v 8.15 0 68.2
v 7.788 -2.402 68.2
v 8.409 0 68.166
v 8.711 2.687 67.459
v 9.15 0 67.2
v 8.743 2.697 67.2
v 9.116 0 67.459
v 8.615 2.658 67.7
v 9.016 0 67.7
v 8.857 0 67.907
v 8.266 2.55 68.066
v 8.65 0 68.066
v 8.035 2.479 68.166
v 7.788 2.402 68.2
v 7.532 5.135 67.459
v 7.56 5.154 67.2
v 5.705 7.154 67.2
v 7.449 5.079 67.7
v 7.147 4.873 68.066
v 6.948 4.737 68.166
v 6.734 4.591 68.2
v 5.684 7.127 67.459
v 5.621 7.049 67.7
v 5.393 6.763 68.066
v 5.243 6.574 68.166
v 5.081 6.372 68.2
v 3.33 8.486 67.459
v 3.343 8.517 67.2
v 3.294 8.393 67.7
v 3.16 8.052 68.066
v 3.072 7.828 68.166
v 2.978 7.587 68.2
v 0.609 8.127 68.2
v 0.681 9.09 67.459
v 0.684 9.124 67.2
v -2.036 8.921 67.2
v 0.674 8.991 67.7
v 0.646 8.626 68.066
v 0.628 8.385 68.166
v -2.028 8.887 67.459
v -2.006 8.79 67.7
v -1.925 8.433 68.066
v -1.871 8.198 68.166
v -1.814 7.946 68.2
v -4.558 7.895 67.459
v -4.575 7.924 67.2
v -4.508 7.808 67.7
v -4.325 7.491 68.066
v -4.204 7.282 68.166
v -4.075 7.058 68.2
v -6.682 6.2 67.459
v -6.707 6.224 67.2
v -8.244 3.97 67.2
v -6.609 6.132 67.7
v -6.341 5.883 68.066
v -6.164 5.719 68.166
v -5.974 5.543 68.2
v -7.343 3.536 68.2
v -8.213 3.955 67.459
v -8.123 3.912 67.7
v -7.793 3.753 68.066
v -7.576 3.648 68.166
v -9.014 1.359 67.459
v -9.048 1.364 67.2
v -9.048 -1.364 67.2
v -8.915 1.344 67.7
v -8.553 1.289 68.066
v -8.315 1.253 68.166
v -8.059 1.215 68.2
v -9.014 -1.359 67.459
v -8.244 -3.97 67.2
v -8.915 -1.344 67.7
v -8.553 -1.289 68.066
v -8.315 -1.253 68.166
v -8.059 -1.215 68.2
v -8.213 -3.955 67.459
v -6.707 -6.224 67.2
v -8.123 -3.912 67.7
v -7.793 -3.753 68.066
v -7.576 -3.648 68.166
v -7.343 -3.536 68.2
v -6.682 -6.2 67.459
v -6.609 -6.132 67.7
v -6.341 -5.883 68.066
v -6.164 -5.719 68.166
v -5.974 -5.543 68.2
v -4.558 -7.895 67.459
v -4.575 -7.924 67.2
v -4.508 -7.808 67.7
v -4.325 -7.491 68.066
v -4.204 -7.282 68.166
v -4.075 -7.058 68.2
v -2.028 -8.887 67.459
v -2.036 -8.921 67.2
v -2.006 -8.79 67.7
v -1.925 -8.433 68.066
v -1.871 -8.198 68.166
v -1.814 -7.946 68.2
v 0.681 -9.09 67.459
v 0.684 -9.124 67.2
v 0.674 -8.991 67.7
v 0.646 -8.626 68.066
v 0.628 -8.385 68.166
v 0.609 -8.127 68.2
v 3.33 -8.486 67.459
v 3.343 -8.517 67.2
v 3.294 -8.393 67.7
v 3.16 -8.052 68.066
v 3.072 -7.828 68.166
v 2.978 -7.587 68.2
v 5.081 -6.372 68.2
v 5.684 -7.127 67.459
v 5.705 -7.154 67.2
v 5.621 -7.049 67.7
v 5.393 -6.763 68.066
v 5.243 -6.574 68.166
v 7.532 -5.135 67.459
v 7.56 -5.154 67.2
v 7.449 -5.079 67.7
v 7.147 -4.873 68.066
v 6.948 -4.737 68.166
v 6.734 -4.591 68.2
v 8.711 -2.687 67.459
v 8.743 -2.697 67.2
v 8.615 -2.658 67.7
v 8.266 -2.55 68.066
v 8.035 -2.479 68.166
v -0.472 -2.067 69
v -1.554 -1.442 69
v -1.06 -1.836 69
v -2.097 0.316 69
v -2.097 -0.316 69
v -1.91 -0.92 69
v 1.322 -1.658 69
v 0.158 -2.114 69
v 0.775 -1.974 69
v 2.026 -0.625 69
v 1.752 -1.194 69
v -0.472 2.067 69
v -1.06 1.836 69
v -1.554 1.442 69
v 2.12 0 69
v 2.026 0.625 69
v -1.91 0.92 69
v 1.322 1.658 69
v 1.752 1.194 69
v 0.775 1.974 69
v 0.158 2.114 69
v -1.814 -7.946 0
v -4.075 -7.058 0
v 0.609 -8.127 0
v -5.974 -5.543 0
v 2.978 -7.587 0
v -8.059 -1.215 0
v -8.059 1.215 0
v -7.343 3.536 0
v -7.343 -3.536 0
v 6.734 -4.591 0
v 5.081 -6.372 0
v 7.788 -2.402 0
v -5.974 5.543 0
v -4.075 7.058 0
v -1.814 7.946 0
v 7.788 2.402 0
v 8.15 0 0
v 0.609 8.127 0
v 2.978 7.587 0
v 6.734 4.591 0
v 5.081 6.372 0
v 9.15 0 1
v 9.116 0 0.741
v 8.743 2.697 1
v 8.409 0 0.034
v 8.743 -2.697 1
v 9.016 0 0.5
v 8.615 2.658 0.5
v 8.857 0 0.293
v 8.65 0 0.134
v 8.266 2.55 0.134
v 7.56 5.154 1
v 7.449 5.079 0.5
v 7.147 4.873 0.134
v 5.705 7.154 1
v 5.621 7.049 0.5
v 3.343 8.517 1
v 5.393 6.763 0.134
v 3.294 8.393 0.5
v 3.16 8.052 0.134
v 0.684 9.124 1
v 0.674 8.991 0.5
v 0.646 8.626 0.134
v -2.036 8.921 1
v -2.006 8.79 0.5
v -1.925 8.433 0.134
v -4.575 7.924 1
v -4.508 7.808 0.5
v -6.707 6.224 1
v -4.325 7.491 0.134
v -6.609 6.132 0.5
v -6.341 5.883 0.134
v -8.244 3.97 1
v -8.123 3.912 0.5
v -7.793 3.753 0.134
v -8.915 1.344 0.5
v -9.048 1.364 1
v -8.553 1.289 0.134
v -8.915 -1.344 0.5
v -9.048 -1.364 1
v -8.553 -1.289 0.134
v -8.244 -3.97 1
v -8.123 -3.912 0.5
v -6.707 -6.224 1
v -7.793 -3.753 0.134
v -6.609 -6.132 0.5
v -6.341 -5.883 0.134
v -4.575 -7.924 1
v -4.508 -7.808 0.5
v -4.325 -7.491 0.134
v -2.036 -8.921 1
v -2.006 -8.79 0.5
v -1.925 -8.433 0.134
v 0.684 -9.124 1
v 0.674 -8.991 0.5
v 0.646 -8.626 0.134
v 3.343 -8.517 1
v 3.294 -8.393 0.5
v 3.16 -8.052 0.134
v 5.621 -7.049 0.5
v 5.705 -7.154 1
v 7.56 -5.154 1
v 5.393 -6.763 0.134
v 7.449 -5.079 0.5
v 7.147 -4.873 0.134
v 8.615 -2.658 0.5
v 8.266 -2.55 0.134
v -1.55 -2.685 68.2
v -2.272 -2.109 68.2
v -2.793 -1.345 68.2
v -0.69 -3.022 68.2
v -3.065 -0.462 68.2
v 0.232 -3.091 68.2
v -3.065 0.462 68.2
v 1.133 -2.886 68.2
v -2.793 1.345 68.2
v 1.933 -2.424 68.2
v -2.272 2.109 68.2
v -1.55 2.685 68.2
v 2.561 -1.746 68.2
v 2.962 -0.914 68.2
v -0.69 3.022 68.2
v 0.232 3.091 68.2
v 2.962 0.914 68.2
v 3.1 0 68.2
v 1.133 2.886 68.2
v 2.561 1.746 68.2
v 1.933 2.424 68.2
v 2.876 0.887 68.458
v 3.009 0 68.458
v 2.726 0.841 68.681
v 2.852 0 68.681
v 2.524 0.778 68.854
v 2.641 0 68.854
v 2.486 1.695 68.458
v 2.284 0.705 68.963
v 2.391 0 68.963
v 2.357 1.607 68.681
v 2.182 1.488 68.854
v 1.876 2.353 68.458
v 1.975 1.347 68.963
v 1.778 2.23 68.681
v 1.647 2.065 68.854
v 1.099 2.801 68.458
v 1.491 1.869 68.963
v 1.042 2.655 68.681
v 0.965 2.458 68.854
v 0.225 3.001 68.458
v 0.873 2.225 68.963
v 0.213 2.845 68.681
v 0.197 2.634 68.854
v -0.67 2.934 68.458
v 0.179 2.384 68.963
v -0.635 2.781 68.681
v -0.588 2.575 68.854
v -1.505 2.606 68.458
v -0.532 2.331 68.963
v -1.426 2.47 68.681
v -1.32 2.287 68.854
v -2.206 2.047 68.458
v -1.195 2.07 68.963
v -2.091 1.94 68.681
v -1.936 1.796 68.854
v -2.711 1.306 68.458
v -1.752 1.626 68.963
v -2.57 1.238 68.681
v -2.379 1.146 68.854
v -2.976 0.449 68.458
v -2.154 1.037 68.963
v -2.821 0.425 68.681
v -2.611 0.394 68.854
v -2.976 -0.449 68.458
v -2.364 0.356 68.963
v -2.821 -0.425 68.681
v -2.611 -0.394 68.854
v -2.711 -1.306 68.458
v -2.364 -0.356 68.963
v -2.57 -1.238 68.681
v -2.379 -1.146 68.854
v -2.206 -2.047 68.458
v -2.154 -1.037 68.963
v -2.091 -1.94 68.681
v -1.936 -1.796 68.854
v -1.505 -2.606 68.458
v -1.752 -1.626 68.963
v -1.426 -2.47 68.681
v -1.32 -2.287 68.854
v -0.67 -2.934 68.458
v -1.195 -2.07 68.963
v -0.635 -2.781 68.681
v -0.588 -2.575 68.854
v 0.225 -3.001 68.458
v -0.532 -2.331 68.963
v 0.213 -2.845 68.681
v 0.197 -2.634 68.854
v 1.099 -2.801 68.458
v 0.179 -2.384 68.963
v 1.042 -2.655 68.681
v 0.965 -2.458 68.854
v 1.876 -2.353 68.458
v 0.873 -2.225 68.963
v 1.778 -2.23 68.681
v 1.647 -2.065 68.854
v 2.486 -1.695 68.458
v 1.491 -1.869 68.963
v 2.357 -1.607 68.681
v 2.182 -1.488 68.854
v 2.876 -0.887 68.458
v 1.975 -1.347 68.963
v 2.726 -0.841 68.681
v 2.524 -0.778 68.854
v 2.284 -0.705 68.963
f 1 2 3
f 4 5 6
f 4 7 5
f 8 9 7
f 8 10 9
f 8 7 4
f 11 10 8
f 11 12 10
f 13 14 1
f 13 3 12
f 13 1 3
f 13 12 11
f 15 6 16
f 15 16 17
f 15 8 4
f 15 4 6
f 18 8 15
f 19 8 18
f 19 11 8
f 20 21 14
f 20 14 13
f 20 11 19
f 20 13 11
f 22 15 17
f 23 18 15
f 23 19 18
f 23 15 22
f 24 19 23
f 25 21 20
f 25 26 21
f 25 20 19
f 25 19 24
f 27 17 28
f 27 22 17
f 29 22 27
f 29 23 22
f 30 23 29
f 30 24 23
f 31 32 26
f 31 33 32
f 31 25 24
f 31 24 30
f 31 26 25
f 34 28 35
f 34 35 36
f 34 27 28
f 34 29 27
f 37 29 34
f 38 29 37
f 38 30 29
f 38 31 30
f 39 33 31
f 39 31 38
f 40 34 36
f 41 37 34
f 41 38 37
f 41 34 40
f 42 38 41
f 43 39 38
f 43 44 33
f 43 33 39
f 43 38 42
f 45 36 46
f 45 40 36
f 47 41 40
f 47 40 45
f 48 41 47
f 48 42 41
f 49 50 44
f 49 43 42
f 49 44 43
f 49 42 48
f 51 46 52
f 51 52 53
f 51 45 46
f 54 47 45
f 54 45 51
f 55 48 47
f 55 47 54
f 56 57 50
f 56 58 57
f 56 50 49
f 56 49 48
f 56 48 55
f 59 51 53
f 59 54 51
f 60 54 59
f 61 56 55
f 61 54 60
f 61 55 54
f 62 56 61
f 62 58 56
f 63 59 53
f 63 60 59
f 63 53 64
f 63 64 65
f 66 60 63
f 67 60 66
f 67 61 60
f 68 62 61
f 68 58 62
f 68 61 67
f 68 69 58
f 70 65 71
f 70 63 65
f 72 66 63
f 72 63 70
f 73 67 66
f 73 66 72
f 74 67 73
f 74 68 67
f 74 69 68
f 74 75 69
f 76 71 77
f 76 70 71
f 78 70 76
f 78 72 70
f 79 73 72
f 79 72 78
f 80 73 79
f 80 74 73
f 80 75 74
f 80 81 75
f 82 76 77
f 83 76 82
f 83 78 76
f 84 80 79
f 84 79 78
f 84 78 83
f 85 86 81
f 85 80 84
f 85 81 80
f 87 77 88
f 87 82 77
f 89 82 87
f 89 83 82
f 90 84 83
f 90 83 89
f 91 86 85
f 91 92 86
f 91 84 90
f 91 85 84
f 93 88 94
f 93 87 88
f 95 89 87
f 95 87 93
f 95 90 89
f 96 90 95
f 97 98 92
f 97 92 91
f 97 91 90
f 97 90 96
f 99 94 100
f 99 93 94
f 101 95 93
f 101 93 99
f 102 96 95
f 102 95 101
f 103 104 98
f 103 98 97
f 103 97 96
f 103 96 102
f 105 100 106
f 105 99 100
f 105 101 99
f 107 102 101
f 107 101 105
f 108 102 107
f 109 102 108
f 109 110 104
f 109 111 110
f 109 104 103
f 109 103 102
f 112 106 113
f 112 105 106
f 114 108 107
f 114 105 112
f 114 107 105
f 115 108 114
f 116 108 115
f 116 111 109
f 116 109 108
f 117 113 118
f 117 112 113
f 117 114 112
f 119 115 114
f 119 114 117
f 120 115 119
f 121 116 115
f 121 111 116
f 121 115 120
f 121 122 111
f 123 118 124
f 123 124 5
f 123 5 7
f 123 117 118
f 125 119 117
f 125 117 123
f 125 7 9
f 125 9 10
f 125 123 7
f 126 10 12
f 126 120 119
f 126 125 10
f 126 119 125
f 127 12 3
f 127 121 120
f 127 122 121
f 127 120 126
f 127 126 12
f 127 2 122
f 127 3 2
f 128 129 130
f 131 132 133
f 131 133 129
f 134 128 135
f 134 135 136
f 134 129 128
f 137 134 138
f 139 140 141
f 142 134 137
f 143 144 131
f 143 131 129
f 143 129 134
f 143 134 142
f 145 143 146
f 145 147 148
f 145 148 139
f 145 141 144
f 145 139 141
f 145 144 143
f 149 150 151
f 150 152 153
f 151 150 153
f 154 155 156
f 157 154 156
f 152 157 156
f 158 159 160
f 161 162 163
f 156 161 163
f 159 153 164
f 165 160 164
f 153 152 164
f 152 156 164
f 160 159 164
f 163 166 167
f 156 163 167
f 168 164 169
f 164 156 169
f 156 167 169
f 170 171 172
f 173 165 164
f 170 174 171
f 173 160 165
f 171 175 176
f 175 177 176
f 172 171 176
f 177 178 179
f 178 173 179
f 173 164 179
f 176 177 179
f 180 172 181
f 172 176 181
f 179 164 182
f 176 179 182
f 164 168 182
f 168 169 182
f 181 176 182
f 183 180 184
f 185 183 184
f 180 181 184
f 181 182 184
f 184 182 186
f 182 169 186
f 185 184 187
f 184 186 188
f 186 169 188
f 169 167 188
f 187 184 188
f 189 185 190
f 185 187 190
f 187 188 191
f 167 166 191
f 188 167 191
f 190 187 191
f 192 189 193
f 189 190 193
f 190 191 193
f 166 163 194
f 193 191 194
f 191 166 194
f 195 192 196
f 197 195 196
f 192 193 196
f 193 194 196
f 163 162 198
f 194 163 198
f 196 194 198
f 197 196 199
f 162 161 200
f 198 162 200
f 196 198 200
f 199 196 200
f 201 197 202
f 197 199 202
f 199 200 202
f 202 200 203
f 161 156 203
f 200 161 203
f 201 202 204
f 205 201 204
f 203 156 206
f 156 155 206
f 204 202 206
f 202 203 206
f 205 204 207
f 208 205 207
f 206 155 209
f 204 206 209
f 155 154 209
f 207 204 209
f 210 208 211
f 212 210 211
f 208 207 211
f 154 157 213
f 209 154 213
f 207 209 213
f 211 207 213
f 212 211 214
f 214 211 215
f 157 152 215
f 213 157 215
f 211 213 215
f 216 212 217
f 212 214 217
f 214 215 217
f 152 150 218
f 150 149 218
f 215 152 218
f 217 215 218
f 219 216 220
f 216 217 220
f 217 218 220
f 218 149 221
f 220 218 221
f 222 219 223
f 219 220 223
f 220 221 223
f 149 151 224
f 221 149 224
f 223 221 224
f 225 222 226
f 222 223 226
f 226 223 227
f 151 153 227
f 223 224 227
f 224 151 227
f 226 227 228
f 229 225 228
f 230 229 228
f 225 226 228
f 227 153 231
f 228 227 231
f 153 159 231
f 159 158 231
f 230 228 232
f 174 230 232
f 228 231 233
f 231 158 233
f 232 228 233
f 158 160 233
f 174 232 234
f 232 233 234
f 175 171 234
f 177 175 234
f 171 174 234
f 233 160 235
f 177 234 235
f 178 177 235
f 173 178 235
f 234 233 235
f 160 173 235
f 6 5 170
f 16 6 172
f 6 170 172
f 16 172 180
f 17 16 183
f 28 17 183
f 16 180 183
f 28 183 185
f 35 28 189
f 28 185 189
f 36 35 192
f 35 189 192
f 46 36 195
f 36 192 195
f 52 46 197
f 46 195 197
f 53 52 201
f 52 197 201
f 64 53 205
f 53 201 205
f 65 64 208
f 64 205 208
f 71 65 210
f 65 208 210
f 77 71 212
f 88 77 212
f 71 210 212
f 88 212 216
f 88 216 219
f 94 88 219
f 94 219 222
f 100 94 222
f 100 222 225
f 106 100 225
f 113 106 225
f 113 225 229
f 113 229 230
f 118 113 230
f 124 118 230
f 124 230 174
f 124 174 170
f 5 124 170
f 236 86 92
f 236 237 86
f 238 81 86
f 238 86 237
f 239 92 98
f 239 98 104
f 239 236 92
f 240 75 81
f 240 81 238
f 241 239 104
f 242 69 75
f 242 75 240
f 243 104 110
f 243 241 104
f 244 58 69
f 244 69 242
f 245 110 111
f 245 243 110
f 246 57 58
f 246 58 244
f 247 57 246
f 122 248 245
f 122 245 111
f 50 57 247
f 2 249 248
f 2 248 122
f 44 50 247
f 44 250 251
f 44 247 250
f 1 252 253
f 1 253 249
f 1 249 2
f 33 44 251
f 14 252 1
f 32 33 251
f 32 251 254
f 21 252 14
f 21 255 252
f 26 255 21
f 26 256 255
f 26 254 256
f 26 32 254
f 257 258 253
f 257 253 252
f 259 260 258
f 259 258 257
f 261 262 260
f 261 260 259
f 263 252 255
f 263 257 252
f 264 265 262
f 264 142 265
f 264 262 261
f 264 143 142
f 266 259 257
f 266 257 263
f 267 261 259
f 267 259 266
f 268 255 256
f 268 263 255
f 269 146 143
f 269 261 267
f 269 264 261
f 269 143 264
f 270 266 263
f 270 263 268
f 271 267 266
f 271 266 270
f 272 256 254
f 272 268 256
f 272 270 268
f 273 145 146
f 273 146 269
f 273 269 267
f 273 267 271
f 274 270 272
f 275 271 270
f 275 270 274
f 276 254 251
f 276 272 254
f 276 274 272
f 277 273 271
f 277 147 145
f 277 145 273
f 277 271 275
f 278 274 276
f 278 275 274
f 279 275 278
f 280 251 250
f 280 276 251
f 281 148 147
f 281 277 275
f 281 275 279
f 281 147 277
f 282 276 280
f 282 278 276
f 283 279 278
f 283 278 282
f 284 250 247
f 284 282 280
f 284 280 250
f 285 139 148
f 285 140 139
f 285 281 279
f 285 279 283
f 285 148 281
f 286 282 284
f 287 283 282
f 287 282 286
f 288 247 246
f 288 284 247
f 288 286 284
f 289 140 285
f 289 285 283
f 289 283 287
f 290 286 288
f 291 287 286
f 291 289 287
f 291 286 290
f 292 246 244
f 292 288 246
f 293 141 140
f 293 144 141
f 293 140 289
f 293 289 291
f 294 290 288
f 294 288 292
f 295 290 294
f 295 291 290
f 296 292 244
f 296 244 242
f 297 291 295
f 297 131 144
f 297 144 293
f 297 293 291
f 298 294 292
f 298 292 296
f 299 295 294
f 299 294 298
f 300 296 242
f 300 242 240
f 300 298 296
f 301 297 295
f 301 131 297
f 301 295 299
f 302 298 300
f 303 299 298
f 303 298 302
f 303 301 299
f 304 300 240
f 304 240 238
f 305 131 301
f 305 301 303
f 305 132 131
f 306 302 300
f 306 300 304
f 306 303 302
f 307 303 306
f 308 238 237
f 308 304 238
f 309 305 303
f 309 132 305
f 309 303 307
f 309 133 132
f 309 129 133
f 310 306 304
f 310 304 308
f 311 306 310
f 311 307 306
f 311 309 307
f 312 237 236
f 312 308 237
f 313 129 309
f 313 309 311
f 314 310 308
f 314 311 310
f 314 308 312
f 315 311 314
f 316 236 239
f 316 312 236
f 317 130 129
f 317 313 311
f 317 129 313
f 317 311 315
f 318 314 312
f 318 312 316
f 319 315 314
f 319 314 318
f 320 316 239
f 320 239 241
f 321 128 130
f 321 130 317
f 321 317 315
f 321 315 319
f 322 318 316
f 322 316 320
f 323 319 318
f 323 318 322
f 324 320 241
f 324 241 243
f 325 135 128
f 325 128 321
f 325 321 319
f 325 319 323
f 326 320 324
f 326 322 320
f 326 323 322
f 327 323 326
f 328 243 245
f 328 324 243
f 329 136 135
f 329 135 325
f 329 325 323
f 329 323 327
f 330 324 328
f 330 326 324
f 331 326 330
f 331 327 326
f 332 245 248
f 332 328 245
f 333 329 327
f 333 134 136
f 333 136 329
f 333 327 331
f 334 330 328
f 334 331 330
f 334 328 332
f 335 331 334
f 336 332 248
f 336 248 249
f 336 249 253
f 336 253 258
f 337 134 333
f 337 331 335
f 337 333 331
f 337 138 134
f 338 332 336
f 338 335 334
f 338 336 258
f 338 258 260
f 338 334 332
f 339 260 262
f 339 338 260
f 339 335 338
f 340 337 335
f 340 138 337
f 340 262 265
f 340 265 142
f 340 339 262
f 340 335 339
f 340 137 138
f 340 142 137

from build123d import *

# Parameters (mm, degrees)
F0_R     = 9.15
F0_R_2   = 3.1
F1_DEPTH = 68.2
F2_DEPTH = 69


# Not quite as in the source:
# - a fillet or chamfer that OpenCascade refuses, or shapes differently, is made with other operations: its cross-section is extruded or revolved along the edge and cut away or added


with BuildPart() as f1:
    # F0 (on Top) → F1 (new body)
    with BuildSketch(Plane.XY):
        Circle(F0_R)
        Circle(F0_R_2, mode=Mode.SUBTRACT)
    extrude(amount=F1_DEPTH)

    # F0 (on Top) → F2 (join)
    with BuildSketch(Plane.XY):
        Circle(F0_R_2)
    extrude(amount=F2_DEPTH)

    # F3: fillet of radius 1 on 3 edges, made by hand

    # F3_s1 → F3_t2 (revolve, cut)
    with BuildSketch(Plane.XZ):
        with BuildLine():
            ThreePointArc((3.1, 68.2), (2.7526596349, 68.7745966692), (2.1202041029, 69))
            Line((2.1202041029, 69), (3.1, 69))
            Line((3.1, 69), (3.1, 68.2))
        make_face()
    revolve(axis=Axis((0, 0, 69), (0, 0, 1)), mode=Mode.SUBTRACT)

    # F3_s3 → F3_t4 (revolve, cut)
    with BuildSketch(Plane.XZ):
        with BuildLine():
            ThreePointArc((9.15, 67.2), (8.8571067812, 67.9071067812), (8.15, 68.2))
            Line((8.15, 68.2), (9.15, 68.2))
            Line((9.15, 68.2), (9.15, 67.2))
        make_face()
    revolve(axis=Axis((0, 0, 68.2), (0, 0, 1)), mode=Mode.SUBTRACT)

    # F3_s5 → F3_t6 (revolve, cut)
    with BuildSketch(Plane.XZ):
        with BuildLine():
            ThreePointArc((9.15, 1), (8.8571067812, 0.2928932188), (8.15, 0))
            Line((8.15, 0), (9.15, 0))
            Line((9.15, 0), (9.15, 1))
        make_face()
    revolve(axis=Axis((0, 0, 0), (0, 0, 1)), mode=Mode.SUBTRACT)


solid = f1.part
